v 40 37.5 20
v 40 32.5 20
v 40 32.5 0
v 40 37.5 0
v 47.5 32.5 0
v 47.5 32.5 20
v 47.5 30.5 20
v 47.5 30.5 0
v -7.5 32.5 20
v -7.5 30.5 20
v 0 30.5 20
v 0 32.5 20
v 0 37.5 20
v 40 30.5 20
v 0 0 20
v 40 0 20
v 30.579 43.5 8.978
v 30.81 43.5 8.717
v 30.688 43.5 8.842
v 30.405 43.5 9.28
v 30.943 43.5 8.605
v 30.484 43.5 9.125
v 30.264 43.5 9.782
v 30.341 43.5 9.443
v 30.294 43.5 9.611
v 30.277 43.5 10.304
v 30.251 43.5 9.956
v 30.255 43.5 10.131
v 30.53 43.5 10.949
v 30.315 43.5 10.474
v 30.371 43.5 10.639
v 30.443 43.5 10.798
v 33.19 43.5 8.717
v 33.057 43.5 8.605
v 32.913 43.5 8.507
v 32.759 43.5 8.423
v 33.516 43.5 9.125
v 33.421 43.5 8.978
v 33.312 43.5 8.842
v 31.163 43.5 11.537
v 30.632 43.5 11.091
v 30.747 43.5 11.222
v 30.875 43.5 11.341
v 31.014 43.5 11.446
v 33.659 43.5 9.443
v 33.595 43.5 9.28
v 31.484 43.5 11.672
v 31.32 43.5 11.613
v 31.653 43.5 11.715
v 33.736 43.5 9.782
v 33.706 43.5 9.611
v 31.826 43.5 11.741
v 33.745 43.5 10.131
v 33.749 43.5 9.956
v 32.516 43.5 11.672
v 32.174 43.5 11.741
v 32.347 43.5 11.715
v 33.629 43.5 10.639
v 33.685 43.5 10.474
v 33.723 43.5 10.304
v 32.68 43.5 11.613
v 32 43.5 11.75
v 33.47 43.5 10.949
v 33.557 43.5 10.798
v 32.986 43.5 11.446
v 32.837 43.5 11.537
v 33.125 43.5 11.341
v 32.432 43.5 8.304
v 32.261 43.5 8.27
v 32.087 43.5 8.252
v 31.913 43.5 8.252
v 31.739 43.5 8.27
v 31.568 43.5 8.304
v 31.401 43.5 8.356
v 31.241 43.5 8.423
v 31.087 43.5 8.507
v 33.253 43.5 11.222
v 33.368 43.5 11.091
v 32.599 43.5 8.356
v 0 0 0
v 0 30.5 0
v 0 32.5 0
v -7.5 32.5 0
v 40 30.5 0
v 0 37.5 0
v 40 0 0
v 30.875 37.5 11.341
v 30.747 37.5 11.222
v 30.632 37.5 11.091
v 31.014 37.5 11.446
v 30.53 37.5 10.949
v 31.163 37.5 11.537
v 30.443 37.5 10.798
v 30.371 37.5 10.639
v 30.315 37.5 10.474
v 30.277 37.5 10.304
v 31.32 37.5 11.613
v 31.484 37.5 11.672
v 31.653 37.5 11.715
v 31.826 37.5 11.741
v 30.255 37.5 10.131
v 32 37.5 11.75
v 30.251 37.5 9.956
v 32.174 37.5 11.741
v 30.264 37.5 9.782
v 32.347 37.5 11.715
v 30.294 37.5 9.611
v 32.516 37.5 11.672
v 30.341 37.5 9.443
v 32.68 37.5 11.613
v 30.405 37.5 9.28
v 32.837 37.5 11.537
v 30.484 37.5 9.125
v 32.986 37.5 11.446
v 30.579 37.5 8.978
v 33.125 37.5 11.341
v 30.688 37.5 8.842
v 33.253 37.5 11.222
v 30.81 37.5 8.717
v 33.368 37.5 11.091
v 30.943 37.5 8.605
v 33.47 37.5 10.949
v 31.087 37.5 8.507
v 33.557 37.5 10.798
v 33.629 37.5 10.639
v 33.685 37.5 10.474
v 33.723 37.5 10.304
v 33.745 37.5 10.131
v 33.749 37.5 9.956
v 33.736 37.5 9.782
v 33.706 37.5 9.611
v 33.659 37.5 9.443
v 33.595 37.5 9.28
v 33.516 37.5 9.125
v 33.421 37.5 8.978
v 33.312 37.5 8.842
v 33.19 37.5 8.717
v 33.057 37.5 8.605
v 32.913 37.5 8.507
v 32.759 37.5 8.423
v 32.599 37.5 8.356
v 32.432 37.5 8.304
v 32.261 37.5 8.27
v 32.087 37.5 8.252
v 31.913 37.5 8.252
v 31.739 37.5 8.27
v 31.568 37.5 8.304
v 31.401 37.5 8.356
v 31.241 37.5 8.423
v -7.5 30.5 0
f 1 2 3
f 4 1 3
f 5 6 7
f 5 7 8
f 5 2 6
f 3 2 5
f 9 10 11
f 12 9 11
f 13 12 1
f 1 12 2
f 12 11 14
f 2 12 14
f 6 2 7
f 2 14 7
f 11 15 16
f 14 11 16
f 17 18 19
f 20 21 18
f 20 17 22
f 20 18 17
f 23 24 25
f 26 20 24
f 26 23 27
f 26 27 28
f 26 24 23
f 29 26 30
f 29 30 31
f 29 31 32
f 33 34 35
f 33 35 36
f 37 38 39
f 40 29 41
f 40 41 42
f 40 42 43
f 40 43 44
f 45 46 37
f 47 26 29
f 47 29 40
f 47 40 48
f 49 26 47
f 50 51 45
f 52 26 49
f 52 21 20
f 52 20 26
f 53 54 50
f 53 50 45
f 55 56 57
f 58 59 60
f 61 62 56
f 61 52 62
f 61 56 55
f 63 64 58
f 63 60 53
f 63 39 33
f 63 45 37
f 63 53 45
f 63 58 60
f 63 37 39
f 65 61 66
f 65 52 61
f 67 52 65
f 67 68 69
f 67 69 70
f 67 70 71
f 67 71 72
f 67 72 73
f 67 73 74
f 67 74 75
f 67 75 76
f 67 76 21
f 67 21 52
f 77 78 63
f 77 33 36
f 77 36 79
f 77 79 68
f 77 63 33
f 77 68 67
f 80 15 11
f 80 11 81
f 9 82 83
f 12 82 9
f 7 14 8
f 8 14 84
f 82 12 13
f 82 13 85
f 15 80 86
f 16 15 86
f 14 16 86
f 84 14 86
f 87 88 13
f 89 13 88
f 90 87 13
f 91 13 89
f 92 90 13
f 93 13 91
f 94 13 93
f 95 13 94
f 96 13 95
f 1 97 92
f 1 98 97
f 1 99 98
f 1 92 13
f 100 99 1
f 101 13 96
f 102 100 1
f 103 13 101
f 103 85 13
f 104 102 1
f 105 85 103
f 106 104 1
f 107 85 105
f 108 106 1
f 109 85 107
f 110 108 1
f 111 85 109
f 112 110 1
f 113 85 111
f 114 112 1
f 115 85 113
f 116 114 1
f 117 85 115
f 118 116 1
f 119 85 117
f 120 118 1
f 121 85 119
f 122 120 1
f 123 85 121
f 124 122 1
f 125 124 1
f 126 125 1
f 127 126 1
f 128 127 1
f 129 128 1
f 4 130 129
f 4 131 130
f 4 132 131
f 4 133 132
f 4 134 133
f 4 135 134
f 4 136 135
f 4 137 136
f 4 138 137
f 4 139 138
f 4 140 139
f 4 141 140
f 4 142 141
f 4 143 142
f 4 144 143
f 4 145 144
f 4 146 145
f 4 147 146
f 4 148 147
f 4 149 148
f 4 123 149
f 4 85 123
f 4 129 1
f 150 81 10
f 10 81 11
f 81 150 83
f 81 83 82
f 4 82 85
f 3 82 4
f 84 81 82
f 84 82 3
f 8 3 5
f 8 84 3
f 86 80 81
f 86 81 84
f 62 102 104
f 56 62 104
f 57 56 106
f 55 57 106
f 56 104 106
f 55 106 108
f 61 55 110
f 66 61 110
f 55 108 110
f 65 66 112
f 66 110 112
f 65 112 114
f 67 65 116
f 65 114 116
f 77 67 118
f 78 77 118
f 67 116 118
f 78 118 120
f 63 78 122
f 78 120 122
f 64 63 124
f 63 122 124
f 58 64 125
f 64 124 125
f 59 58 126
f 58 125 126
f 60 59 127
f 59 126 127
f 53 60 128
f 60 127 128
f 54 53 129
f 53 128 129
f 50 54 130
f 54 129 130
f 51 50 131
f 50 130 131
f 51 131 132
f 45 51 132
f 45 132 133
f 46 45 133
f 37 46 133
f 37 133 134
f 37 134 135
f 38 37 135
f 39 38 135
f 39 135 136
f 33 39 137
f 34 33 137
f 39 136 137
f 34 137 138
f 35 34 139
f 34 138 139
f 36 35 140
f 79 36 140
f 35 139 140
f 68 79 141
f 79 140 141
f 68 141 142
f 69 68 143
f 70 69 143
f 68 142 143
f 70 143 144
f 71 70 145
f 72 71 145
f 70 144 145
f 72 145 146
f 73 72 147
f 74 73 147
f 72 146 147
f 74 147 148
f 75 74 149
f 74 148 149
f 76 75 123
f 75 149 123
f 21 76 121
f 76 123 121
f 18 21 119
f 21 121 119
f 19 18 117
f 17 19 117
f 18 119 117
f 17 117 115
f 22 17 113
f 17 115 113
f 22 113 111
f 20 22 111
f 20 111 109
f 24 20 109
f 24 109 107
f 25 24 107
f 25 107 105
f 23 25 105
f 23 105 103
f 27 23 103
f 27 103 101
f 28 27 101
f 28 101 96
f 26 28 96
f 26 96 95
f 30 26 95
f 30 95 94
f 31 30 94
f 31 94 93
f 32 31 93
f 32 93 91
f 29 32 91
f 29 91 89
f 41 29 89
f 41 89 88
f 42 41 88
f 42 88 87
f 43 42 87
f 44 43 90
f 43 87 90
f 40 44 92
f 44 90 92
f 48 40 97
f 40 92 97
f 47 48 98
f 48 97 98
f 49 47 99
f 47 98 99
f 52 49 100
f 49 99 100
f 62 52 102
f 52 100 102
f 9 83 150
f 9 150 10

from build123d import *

# Parameters (mm, degrees)
SKETCH1_W           = 40
SKETCH1_H           = 20
BOSS_EXTRUDE1_DEPTH = 37.5
SKETCH2_W           = 20
SKETCH2_H           = 2
BOSS_EXTRUDE2_DEPTH = 7.5
SKETCH3_W           = 20
SKETCH3_H           = 2
BOSS_EXTRUDE3_DEPTH = 7.5
SKETCH4_R           = 1.75
BOSS_EXTRUDE4_DEPTH = 6


with BuildPart() as part:
    # Sketch1 → Boss-Extrude1 (new body)
    with BuildSketch(Plane(origin=(0, 0, 0), x_dir=(1, 0, 0), z_dir=(0, 1, 0))):
        with Locations((20, -10)):
            Rectangle(SKETCH1_W, SKETCH1_H)
    extrude(amount=BOSS_EXTRUDE1_DEPTH)

    # Sketch2 → Boss-Extrude2 (add)
    with BuildSketch(Plane(origin=(40, 0, 0), x_dir=(0, 0, -1), z_dir=(1, 0, 0))):
        with Locations((-10, 31.5)):
            Rectangle(SKETCH2_W, SKETCH2_H)
    extrude(amount=BOSS_EXTRUDE2_DEPTH)

    # Sketch3 → Boss-Extrude3 (add)
    with BuildSketch(Plane.ZY):
        with Locations((10, 31.5)):
            Rectangle(SKETCH3_W, SKETCH3_H)
    extrude(amount=BOSS_EXTRUDE3_DEPTH)

    # Sketch4 → Boss-Extrude4 (add)
    with BuildSketch(Plane(origin=(0, 37.5, 0), x_dir=(1, 0, 0), z_dir=(0, 1, 0))):
        with Locations(Location((32, -10, 0), (0, 0, 270))):
            Circle(SKETCH4_R)
    extrude(amount=BOSS_EXTRUDE4_DEPTH)


solid = part.part
